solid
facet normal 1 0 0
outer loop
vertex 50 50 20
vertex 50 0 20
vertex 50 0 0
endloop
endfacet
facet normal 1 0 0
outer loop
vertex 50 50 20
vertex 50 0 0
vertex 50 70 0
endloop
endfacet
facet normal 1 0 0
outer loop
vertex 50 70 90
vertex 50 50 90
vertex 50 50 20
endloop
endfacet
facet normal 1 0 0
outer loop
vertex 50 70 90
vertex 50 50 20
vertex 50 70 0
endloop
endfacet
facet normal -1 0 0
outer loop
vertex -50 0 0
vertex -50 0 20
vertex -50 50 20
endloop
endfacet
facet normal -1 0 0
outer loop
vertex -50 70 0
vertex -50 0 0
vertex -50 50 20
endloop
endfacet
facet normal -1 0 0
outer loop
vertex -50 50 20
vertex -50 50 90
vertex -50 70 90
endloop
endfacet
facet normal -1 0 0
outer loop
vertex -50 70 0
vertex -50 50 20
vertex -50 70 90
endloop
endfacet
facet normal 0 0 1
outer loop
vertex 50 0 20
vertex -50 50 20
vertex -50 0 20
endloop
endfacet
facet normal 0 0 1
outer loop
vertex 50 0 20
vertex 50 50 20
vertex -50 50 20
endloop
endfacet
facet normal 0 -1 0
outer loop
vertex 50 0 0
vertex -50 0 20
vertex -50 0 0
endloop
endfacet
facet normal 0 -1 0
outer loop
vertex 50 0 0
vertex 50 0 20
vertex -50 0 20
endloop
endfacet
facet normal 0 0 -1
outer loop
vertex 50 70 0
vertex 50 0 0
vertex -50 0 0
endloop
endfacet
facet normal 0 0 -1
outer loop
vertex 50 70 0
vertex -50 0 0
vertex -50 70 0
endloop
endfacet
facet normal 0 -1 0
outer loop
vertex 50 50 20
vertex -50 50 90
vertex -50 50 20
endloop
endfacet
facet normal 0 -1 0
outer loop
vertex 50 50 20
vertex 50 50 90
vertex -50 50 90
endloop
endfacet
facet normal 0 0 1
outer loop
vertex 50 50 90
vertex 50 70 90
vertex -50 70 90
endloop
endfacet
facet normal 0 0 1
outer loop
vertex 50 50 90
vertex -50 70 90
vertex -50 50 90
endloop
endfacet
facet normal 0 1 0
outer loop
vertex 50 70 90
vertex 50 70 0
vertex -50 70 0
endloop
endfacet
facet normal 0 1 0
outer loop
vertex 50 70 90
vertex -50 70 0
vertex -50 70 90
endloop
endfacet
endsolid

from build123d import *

# Parameters (mm, degrees)
F1_DEPTH      = 50
F1_DEPTH_BACK = 50


with BuildPart() as f1:
    # F0 (on Right) → F1 (new body, two sides)
    with BuildSketch(Plane.YZ) as f1_sk:
        Polygon((0, 20), (0, 0), (70, 0), (70, 90), (50, 90), (50, 20), align=None)
    extrude(amount=F1_DEPTH)
    extrude(f1_sk.sketch, amount=-F1_DEPTH_BACK)


solid = f1.part
